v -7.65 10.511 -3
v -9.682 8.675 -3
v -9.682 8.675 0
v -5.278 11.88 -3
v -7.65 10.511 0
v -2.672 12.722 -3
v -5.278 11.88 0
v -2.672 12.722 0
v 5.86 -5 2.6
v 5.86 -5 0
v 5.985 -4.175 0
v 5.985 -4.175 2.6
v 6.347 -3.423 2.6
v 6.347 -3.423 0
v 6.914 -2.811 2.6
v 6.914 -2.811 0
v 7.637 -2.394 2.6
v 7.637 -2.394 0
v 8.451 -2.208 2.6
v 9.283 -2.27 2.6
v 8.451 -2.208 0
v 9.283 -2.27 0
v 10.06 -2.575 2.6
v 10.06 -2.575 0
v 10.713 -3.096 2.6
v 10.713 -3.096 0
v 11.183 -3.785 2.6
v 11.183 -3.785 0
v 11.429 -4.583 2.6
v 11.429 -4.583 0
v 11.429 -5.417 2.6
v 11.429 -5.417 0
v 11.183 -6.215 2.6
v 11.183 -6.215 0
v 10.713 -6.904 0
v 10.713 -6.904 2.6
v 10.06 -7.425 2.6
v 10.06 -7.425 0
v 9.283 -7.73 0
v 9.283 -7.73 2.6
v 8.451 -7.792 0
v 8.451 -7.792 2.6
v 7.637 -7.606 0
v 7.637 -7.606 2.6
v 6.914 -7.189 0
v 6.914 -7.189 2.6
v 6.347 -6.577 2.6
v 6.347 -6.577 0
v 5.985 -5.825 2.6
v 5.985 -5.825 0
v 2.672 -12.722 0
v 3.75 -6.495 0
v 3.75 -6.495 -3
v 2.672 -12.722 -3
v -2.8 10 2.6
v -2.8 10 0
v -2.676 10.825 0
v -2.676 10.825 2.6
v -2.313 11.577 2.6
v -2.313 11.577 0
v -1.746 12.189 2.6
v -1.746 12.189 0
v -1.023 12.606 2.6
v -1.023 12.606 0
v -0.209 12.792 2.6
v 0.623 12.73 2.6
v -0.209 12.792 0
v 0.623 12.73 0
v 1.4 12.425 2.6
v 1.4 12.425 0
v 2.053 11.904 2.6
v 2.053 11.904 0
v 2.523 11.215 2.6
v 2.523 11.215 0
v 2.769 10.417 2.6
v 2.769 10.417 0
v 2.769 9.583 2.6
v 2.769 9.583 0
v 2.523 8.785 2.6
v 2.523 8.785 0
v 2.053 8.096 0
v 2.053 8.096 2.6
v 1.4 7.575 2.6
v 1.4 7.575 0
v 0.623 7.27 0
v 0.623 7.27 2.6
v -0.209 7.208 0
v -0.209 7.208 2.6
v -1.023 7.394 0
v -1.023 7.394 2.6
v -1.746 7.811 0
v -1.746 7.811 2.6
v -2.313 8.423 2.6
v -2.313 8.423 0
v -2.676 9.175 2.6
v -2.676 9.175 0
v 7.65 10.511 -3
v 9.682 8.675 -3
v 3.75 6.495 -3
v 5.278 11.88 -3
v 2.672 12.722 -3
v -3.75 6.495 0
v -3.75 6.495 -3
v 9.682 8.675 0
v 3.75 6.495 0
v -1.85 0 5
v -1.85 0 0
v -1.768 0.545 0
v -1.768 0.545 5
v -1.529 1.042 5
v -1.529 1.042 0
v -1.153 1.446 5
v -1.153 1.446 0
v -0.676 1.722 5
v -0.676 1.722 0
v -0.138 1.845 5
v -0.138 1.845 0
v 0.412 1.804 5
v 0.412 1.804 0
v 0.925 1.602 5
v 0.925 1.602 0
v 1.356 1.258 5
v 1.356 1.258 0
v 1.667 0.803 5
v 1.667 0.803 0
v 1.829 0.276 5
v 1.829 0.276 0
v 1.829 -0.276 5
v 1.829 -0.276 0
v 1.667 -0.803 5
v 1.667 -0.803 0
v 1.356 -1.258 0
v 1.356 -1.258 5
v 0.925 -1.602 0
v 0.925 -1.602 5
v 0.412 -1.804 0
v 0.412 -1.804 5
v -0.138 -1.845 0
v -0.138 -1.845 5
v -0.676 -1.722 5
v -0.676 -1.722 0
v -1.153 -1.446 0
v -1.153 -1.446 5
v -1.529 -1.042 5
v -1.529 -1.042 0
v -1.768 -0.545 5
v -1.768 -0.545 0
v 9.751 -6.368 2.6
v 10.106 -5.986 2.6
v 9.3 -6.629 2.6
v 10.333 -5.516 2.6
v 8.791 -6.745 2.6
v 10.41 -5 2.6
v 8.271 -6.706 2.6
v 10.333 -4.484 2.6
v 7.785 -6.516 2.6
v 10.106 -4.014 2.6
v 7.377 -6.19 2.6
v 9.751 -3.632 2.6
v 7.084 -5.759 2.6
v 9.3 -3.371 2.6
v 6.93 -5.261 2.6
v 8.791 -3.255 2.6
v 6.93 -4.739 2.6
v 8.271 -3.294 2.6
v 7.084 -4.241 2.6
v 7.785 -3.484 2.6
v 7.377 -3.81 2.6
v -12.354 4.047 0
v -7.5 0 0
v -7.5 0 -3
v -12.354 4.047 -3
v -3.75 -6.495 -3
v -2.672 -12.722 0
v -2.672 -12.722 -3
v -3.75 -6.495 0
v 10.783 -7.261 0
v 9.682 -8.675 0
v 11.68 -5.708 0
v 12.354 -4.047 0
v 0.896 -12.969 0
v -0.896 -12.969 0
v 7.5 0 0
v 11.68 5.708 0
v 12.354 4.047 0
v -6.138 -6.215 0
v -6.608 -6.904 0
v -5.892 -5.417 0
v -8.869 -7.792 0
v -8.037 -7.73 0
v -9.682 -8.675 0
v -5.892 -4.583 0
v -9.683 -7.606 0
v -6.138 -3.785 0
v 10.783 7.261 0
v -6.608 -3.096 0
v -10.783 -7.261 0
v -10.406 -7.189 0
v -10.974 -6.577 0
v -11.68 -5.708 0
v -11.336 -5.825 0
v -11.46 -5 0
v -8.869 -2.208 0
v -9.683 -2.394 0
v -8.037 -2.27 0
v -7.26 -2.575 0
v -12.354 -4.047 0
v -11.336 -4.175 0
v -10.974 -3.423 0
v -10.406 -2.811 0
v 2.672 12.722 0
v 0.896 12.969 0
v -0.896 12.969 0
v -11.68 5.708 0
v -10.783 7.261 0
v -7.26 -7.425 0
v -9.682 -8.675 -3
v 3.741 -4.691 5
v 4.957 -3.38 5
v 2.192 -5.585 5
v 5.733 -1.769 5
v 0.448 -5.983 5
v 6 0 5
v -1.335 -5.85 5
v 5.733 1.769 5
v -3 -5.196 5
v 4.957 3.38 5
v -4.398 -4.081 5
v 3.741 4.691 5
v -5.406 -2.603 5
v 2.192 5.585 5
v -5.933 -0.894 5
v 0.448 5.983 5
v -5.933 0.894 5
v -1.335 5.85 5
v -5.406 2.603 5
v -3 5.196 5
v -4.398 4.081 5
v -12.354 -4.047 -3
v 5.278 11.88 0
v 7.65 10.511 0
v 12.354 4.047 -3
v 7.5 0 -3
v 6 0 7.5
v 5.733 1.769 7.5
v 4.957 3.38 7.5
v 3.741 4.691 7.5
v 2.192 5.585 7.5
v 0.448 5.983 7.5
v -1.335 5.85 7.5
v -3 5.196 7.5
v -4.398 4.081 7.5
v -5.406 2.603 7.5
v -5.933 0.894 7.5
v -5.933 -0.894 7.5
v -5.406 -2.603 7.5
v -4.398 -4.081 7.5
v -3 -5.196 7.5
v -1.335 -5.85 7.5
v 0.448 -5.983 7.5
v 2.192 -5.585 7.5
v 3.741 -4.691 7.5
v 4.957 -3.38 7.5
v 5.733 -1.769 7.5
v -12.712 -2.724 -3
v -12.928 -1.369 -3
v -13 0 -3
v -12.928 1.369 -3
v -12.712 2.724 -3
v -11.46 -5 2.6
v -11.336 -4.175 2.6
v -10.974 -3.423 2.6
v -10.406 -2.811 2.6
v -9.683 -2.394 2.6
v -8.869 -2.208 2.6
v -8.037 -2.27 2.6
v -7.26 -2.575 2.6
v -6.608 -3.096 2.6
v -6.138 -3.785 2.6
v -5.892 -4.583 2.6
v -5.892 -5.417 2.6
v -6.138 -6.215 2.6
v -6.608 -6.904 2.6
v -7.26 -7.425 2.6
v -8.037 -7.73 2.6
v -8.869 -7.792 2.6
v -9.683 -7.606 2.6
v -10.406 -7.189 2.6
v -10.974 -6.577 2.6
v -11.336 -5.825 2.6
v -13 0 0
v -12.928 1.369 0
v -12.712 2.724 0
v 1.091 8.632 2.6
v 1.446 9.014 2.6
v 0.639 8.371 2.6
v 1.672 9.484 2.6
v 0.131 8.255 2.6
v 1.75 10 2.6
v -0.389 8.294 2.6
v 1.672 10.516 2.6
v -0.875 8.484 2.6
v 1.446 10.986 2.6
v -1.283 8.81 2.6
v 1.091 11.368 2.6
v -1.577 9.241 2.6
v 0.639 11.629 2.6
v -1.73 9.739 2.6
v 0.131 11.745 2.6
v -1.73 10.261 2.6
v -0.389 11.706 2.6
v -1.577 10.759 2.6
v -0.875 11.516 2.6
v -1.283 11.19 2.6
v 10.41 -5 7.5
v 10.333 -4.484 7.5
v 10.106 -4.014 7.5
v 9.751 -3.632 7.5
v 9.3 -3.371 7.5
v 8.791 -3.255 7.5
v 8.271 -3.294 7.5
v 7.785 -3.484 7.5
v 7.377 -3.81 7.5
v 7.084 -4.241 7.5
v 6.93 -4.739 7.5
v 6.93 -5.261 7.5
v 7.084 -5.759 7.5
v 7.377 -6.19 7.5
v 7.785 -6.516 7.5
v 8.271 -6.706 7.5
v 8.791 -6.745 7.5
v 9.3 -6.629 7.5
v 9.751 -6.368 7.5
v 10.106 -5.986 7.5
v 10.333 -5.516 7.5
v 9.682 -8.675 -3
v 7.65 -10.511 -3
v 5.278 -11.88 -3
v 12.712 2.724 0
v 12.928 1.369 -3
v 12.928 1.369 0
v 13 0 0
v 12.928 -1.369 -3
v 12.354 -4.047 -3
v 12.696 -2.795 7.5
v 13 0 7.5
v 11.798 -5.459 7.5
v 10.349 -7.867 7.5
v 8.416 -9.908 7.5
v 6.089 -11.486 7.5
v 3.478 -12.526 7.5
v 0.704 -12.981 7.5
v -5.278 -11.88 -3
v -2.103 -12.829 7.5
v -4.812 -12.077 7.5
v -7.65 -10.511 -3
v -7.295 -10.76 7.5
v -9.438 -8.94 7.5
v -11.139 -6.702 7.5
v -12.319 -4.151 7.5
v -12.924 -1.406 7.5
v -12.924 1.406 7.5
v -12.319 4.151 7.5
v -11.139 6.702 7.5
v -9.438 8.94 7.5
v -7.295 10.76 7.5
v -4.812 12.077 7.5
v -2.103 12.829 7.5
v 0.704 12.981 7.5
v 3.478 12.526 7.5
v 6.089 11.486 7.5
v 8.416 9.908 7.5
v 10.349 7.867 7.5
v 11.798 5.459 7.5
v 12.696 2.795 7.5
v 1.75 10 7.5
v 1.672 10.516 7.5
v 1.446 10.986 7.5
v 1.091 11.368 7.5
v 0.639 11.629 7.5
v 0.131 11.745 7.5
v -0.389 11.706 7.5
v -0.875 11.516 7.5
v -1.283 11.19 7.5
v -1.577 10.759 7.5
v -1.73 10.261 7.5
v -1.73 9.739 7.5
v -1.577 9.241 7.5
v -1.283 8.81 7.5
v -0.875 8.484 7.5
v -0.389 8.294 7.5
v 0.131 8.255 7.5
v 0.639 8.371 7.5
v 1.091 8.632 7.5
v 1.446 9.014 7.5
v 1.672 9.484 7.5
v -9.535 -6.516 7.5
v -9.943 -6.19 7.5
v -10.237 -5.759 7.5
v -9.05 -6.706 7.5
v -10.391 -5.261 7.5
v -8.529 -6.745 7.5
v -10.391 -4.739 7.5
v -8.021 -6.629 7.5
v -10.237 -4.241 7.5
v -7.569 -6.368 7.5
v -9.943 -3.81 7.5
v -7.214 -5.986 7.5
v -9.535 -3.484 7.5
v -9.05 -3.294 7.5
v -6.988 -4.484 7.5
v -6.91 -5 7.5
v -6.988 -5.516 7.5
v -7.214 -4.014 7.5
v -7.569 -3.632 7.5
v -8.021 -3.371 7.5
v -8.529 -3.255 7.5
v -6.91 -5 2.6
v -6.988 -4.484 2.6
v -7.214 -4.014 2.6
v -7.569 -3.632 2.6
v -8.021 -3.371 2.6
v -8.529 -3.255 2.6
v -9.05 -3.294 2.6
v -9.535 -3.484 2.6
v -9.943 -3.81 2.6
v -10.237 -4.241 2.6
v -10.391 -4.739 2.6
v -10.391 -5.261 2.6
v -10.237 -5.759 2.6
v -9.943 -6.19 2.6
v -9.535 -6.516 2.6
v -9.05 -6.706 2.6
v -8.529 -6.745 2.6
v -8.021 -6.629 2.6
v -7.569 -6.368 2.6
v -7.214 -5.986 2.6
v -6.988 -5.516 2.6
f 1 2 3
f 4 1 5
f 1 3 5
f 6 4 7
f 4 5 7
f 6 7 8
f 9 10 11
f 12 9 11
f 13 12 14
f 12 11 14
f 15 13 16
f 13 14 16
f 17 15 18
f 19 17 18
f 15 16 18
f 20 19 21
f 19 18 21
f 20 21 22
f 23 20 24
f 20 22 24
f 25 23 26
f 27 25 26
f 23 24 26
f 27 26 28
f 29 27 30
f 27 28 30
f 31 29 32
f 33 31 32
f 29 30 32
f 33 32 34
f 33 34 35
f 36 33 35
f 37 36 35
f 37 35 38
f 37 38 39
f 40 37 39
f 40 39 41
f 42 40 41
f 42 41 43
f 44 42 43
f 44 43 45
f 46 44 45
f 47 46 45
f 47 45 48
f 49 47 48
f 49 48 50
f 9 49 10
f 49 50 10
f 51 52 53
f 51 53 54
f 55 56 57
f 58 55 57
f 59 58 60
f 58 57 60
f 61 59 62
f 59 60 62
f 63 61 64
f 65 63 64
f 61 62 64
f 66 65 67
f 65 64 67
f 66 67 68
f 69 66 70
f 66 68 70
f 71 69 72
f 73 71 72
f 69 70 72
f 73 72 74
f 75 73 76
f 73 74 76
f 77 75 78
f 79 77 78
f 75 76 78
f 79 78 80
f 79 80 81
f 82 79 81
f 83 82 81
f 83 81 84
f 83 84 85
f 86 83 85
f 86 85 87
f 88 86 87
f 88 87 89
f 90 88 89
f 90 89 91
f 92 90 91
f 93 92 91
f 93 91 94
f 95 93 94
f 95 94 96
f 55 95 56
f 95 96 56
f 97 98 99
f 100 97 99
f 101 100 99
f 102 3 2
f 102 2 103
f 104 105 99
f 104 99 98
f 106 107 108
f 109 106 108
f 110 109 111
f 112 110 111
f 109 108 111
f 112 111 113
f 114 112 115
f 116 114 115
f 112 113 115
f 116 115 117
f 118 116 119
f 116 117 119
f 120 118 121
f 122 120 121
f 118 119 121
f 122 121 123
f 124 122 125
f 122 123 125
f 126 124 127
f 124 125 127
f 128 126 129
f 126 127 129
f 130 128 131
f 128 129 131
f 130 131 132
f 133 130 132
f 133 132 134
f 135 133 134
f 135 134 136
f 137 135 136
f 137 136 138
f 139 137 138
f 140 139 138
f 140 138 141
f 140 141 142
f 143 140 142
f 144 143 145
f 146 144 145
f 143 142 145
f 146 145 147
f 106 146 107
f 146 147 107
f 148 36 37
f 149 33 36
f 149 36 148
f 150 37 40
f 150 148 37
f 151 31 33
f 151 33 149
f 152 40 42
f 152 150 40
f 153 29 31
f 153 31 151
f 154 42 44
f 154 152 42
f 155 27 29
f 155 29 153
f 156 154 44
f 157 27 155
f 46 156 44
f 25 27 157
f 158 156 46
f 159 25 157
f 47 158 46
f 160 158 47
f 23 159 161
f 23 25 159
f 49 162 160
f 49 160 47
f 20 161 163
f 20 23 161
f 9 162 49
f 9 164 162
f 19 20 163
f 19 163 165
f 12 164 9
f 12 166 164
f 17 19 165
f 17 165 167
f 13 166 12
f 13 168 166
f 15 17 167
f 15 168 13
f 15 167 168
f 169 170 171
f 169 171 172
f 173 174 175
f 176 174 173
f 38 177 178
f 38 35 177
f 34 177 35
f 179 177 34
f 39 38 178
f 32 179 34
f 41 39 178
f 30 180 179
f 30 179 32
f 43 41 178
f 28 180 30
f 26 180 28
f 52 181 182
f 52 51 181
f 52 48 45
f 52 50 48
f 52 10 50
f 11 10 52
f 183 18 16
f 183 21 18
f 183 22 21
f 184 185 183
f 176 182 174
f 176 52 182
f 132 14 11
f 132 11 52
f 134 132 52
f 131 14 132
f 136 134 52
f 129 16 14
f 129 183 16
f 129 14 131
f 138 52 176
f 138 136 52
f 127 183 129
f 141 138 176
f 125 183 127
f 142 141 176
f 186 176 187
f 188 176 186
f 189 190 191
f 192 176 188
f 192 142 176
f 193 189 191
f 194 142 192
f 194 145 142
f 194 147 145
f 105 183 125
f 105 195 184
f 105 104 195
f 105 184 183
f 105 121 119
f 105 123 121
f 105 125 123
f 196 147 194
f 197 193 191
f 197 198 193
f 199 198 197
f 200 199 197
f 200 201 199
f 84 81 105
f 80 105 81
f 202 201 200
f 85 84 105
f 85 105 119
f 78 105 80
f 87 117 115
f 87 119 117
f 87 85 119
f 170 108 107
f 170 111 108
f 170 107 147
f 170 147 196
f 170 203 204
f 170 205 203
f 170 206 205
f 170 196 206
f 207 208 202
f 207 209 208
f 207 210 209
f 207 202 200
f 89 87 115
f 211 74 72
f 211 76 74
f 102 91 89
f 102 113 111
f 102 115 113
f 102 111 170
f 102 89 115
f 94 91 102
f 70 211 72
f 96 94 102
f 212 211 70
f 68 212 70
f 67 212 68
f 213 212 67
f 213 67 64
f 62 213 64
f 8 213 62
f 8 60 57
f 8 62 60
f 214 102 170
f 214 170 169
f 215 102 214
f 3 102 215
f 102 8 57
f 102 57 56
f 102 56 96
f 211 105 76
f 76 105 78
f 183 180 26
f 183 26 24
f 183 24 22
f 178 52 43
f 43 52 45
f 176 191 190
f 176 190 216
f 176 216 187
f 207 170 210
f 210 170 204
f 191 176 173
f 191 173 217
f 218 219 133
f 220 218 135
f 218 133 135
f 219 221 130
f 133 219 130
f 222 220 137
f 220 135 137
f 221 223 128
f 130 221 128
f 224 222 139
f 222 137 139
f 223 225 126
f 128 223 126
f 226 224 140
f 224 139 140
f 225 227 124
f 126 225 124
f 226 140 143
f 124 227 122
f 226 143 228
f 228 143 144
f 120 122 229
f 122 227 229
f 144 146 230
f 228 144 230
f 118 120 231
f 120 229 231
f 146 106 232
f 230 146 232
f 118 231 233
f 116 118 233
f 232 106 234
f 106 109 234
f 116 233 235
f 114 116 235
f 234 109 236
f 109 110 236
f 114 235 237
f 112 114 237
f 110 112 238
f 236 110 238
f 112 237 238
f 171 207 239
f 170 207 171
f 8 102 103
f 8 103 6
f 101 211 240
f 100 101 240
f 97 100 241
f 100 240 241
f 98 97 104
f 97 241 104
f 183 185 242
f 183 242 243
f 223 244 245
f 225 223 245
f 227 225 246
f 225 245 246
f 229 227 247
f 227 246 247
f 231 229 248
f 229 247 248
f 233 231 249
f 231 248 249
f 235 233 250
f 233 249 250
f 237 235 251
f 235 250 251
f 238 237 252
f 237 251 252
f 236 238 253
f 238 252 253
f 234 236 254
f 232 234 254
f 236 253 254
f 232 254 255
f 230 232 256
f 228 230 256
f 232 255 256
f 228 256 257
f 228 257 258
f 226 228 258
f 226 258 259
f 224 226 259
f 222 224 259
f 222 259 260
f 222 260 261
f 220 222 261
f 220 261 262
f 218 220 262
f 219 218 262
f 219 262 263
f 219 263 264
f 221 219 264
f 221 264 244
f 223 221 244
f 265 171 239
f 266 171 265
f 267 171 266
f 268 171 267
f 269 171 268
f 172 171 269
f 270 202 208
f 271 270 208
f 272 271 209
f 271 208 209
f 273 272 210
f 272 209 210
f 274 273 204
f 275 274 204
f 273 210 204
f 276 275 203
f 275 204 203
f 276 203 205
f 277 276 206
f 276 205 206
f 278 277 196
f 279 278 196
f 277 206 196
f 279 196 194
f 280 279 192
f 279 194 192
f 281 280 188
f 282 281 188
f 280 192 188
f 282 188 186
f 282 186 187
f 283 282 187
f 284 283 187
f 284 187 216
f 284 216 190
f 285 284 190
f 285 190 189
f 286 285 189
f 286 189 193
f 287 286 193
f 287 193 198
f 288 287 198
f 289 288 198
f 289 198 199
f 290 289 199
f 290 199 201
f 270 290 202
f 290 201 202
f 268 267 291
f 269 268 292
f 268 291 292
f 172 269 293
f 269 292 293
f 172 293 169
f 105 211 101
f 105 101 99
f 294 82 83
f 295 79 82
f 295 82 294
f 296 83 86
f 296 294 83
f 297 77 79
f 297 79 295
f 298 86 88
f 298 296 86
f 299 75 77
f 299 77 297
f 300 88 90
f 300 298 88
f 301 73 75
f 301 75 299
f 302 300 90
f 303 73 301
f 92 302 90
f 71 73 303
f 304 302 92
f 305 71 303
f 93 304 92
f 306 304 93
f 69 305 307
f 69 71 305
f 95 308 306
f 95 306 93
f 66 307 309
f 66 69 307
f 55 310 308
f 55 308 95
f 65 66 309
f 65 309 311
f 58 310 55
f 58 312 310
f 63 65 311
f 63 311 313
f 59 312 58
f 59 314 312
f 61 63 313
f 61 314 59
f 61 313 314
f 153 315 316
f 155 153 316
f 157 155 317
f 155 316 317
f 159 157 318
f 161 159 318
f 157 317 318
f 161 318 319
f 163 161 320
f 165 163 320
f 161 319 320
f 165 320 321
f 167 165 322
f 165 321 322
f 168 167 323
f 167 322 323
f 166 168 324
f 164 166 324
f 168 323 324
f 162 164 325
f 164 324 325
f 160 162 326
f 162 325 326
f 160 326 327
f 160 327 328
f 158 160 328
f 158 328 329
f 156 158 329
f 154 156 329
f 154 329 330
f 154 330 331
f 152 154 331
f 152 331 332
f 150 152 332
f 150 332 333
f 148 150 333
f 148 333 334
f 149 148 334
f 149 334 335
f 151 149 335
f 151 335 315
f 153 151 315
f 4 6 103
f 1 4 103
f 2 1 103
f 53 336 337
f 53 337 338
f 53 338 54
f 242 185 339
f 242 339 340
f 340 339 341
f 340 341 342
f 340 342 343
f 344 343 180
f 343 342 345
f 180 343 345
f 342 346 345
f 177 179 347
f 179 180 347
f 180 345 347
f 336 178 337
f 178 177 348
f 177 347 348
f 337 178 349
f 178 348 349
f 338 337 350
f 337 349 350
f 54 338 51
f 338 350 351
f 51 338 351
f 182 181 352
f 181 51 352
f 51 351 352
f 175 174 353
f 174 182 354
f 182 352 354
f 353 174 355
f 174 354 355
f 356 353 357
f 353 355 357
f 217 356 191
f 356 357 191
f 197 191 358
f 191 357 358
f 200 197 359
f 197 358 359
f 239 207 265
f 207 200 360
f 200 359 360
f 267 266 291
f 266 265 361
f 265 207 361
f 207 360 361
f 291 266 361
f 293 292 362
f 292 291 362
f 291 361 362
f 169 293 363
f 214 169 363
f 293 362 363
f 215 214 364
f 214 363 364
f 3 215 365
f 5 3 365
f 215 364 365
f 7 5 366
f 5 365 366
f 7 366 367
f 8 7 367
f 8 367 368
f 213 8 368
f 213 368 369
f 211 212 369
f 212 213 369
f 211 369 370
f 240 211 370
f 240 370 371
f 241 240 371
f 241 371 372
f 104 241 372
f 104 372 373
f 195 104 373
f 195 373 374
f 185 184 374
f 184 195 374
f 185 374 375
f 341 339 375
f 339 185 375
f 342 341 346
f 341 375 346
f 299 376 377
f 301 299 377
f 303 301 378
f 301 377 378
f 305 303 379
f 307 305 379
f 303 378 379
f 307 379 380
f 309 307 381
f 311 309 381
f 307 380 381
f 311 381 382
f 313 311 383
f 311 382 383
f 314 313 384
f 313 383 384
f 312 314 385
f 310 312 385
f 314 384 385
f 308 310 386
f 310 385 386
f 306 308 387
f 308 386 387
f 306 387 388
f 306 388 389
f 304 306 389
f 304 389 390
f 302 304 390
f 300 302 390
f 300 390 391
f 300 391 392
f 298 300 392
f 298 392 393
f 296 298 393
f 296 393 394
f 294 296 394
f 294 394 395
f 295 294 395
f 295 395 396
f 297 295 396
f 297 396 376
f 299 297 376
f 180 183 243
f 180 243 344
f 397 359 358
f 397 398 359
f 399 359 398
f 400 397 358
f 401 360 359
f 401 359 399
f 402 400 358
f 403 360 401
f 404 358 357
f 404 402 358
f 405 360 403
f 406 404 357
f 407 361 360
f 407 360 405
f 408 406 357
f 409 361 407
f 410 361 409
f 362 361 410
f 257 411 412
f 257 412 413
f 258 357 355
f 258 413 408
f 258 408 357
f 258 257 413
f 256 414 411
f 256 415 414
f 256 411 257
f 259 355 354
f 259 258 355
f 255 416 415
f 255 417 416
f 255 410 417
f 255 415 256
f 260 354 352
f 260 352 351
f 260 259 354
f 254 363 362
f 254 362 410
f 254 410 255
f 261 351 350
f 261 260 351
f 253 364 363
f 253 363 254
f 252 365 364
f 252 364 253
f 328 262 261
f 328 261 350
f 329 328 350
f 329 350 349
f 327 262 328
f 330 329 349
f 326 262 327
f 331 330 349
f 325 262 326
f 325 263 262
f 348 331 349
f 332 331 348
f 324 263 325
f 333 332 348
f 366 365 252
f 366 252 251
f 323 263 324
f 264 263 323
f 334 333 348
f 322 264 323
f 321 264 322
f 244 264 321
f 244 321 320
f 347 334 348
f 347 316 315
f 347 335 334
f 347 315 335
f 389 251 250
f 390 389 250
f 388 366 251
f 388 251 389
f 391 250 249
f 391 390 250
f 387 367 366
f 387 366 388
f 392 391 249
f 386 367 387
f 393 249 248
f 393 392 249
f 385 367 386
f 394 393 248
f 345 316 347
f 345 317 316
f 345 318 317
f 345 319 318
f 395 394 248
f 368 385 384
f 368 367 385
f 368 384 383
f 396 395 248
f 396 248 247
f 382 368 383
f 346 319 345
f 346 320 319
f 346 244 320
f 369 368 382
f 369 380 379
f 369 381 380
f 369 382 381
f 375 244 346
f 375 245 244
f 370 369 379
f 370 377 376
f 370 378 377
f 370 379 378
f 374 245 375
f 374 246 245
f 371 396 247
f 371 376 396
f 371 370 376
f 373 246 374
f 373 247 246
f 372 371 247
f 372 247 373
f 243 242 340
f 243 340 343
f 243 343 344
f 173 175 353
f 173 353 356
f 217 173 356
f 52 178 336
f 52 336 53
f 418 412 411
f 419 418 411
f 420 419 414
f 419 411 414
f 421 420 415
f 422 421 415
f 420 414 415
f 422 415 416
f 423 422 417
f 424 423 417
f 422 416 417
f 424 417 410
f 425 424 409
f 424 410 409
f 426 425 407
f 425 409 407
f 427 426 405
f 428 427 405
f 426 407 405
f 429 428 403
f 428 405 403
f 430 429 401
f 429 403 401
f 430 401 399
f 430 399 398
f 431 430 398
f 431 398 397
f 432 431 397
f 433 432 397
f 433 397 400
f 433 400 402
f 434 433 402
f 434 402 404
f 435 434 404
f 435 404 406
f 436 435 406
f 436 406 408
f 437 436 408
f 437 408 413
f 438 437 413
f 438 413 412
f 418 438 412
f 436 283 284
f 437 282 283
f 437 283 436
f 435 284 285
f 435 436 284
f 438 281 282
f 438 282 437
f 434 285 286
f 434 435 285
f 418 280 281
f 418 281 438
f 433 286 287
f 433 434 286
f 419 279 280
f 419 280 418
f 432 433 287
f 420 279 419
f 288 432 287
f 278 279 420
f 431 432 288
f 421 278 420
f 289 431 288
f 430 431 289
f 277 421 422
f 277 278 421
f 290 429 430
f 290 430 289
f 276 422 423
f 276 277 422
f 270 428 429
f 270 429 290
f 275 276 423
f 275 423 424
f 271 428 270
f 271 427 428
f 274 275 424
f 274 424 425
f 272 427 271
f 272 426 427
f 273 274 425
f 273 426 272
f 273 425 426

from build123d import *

# Parameters (mm, degrees)
SKETCH_3_R          = 13
EXTRUDE_1_DEPTH     = 7.5
SKETCH_4_R          = 1.75
CUT_EXTRUDE_1_DEPTH = 8.5
SKETCH_5_R          = 2.8
CUT_EXTRUDE_2_DEPTH = 2.6
SKETCH_6_R          = 6
CUT_EXTRUDE_3_DEPTH = 8.5
SKETCH_7_R          = 13
SKETCH_7_R_2        = 2.8
EXTRUDE_2_DEPTH     = 3
CUT_EXTRUDE_4_DEPTH = 4
SKETCH_8_R          = 6
SKETCH_8_R_2        = 1.85
EXTRUDE_3_DEPTH     = 5


with BuildPart() as part:
    # ｽｹｯﾁ3 → ﾎﾞｽ - 押し出し1 (new body)
    with BuildSketch(Plane.XY):
        Circle(SKETCH_3_R)
    extrude(amount=EXTRUDE_1_DEPTH)

    # ｽｹｯﾁ4 → ｶｯﾄ - 押し出し1 (cut, through all)
    with BuildSketch(Plane.XY.offset(7.5)):
        with Locations((0, 10)):
            Circle(SKETCH_4_R)
        with Locations((8.660254038, -5)):
            Circle(SKETCH_4_R)
        with Locations((-8.660254038, -5)):
            Circle(SKETCH_4_R)
    extrude(amount=-CUT_EXTRUDE_1_DEPTH, mode=Mode.SUBTRACT)

    # ｽｹｯﾁ5 → ｶｯﾄ - 押し出し2 (cut)
    with BuildSketch(Plane(origin=(0, 0, 0), x_dir=(-1, 0, 0), z_dir=(0, 0, -1))):
        with Locations((8.660254038, -5)):
            Circle(SKETCH_5_R)
        with Locations((0, 10)):
            Circle(SKETCH_5_R)
        with Locations((-8.660254038, -5)):
            Circle(SKETCH_5_R)
    extrude(amount=-CUT_EXTRUDE_2_DEPTH, mode=Mode.SUBTRACT)

    # ｽｹｯﾁ6 → ｶｯﾄ - 押し出し3 (cut, through all)
    with BuildSketch(Plane.XY.offset(7.5)):
        Circle(SKETCH_6_R)
    extrude(amount=-CUT_EXTRUDE_3_DEPTH, mode=Mode.SUBTRACT)

    # ｽｹｯﾁ7 → ﾎﾞｽ - 押し出し2 (add)
    with BuildSketch(Plane(origin=(0, 0, 0), x_dir=(-1, 0, 0), z_dir=(0, 0, -1))):
        Circle(SKETCH_7_R)
        with Locations((0, 10)):
            Circle(SKETCH_7_R_2, mode=Mode.SUBTRACT)
        with Locations((8.660254038, -5)):
            Circle(SKETCH_7_R_2, mode=Mode.SUBTRACT)
        with Locations((-8.660254038, -5)):
            Circle(SKETCH_7_R_2, mode=Mode.SUBTRACT)
    extrude(amount=EXTRUDE_2_DEPTH)

    # ｽｹｯﾁ2 → ｶｯﾄ - 押し出し4 (cut, through all)
    with BuildSketch(Plane.XY):
        with BuildLine():
            Line((-3.75, 6.495190528), (-2.463350586, 13.926501921))
            ThreePointArc((-2.463350586, 13.926501921), (0, 16), (2.463350586, 13.926501921))
            Line((2.463350586, 13.926501921), (3.75, 6.495190528))
            Line((3.75, 6.495190528), (10.829029157, 9.096575147))
            ThreePointArc((10.829029157, 9.096575147), (13.856406461, 8), (13.292379743, 4.829926775))
            Line((13.292379743, 4.829926775), (7.5, 0))
            Line((7.5, 0), (13.292379743, -4.829926775))
            ThreePointArc((13.292379743, -4.829926775), (13.856406461, -8), (10.829029157, -9.096575147))
            Line((10.829029157, -9.096575147), (3.75, -6.495190528))
            Line((3.75, -6.495190528), (2.463350586, -13.926501921))
            ThreePointArc((2.463350586, -13.926501921), (0, -16), (-2.463350586, -13.926501921))
            Line((-2.463350586, -13.926501921), (-3.75, -6.495190528))
            Line((-3.75, -6.495190528), (-10.829029157, -9.096575147))
            ThreePointArc((-10.829029157, -9.096575147), (-13.856406461, -8), (-13.292379743, -4.829926775))
            Line((-13.292379743, -4.829926775), (-7.5, 0))
            Line((-7.5, 0), (-13.292379743, 4.829926775))
            ThreePointArc((-13.292379743, 4.829926775), (-13.856406461, 8), (-10.829029157, 9.096575147))
            Line((-10.829029157, 9.096575147), (-3.75, 6.495190528))
        make_face()
    extrude(amount=-CUT_EXTRUDE_4_DEPTH, mode=Mode.SUBTRACT)

    # ｽｹｯﾁ8 → ﾎﾞｽ - 押し出し3 (add)
    with BuildSketch(Plane(origin=(0, 0, 0), x_dir=(-1, 0, 0), z_dir=(0, 0, -1))):
        Circle(SKETCH_8_R)
        Circle(SKETCH_8_R_2, mode=Mode.SUBTRACT)
    extrude(amount=-EXTRUDE_3_DEPTH)


solid = part.part
